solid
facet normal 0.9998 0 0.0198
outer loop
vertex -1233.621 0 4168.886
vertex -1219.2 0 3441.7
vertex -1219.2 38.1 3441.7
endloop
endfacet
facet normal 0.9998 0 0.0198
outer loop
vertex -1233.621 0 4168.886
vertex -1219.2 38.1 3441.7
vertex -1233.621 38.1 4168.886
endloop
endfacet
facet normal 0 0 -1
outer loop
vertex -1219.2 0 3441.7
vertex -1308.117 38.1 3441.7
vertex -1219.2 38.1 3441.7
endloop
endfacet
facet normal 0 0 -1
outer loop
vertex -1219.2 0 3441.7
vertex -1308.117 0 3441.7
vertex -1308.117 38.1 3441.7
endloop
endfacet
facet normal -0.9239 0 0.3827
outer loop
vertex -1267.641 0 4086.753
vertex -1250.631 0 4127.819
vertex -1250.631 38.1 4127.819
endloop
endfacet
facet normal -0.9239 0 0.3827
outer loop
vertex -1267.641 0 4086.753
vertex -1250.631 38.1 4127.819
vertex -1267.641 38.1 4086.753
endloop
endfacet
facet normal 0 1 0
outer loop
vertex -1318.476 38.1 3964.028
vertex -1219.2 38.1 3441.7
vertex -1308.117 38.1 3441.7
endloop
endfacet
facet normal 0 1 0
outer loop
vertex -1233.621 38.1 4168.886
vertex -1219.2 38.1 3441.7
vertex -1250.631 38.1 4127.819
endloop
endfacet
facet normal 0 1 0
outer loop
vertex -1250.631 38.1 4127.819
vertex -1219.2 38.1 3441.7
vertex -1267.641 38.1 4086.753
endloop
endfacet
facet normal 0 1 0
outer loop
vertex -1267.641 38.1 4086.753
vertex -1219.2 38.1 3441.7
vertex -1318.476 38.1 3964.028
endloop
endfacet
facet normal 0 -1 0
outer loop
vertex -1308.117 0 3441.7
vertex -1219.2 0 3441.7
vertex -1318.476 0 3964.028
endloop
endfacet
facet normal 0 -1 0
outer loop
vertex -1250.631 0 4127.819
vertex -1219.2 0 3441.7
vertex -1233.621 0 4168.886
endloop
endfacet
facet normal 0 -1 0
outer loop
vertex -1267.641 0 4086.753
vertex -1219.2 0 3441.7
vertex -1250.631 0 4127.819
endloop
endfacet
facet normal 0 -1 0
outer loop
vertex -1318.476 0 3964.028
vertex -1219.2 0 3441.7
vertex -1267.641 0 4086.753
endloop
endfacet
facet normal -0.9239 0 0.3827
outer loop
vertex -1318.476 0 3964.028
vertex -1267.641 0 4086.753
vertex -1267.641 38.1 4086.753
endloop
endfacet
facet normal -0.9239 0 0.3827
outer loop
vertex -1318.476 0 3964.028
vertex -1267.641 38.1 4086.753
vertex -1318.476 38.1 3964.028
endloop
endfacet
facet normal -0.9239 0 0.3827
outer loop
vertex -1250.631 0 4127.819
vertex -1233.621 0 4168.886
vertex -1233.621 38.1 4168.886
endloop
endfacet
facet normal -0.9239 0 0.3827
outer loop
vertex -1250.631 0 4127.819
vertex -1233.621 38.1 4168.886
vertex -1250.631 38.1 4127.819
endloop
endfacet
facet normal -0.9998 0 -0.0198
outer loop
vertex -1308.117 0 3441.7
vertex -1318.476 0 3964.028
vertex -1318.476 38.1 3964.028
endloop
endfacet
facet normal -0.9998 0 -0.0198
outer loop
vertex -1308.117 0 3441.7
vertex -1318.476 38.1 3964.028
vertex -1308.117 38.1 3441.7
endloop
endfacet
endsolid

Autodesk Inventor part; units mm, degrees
ref_plane "YZ Plane" through (0, 0, 0) normal (1, 0, 0) x (0, 1, 0)
ref_plane "XZ Plane" through (0, 0, 0) normal (0, 1, 0) x (-1, 0, 0)
ref_plane "XY Plane" through (0, 0, 0) normal (0, 0, 1) x (1, 0, 0)
sketch "Sketch1" plane through (0, 0, 0) normal (0, 1, 0) x (-1, 0, 0)
  line L0 (0, 0) -> (0, -1219.2)
  line L1 (0, 0) -> (88.9, 0)
  line L2 (88.9, 0) -> (88.9, -1219.2)
  line L3 (88.9, -1219.2) -> (0, -1219.2)
  line L4 (0, 0) -> (0, 1219.2) construction
  line L5 (0, 1219.2) -> (1219.2, 1219.2) construction
  line L6 (0, 1219.2) -> (0, 3657.6) construction
  line L7 (0, 3657.6) -> (0, 4876.8) construction
  line L8 (0, 4876.8) -> (0, 6096) construction
  line L9 (0, -1219.2) -> (2438.4, -1219.2) construction
  line L10 (0, 6096) -> (2438.4, 6096) construction
  line L11 (2438.4, 6096) -> (2438.4, -1219.2) construction
  line L12 (0, 3657.6) -> (0, 3352.8) construction
  line L13 (0, 3352.8) -> (2438.4, 3352.8) construction
  line L14 (2438.4, 3352.8) -> (1219.2, 3352.8)
  line L15 (1219.2, 3352.8) -> (1219.2, 3263.9)
  line L16 (1219.2, 3263.9) -> (2438.4, 3263.9)
  line L17 (2438.4, 3263.9) -> (2438.4, 3352.8)
  line L18 (0, 6096) -> (862.1046, 6958.1046)
  line L19 (862.1046, 6958.1046) -> (924.9664, 6895.2428)
  line L20 (924.9664, 6895.2428) -> (62.8618, 6033.1382)
  line L21 (62.8618, 6033.1382) -> (0, 6096)
  line L22 (0, 4876.8) -> (1219.2, 4876.8) construction
  line L23 (1219.2, 4876.8) -> (2081.3046, 5738.9046)
  line L24 (1219.2, 1219.2) -> (2081.3046, 357.0954)
  line L25 (2081.3046, 357.0954) -> (2018.4428, 294.2336)
  line L26 (2018.4428, 294.2336) -> (1156.3382, 1156.3382)
  line L27 (1156.3382, 1156.3382) -> (1219.2, 1219.2)
  line L28 (2018.4428, 294.2336) -> (88.9, -1219.2)
  line L29 (2081.3046, 357.0954) -> (2144.1664, 419.9572)
  line L30 (2144.1664, 419.9572) -> (1282.0618, 1282.0618)
  line L31 (1282.0618, 1282.0618) -> (1219.2, 1219.2)
  line L32 (2438.4, 3352.8) -> (2438.4, 3441.7)
  line L33 (2438.4, 3441.7) -> (1219.2, 3441.7)
  line L34 (1219.2, 3441.7) -> (1219.2, 3352.8)
  line L35 (1156.3382, 4939.6618) -> (1282.0618, 4813.9382)
  line L36 (2018.4428, 5801.7664) -> (2144.1664, 5676.0428)
  line L37 (1282.0618, 4813.9382) -> (2144.1664, 5676.0428)
  line L38 (2018.4428, 5801.7664) -> (1156.3382, 4939.6618)
  line L39 (2018.4428, 5801.7664) -> (924.9664, 6895.2428)
  line L40 (62.8618, 6033.1382) -> (1156.3382, 4939.6618)
  line L41 (1233.6206, 4168.8855) -> (1267.6412, 4086.7527)
  line L42 (1263.7078, 2313.9849) -> (1230.0006, 2231.7229)
  arc A0 (862.1046, 6958.1046) -> (0, 6096) centre (431.0523, 6527.0523) ccw
  line L43 (1246.8542, 2272.8539) -> (2375.0183, 1810.583)
  line L44 (2391.8719, 1851.7139) -> (2358.1646, 1769.452)
  line L45 (2391.8719, 1851.7139) -> (1263.7078, 2313.9849)
  line L46 (1230.0006, 2231.7229) -> (2358.1646, 1769.452)
  line L47 (1230.0006, 2231.7229) -> (1219.2, 3263.9)
  line L48 (2144.1664, 419.9572) -> (2391.8719, 1851.7139)
  line L49 (2391.8719, 1851.7139) -> (2438.4, 3263.9)
  line L50 (1219.2, 3441.7) -> (1233.6206, 4168.8855)
  line L51 (1250.6309, 4127.8191) -> (2377.0248, 4594.3867)
  line L52 (2360.0145, 4635.4532) -> (2394.0351, 4553.3203)
  line L53 (2394.0351, 4553.3203) -> (1267.6412, 4086.7527)
  line L54 (2360.0145, 4635.4532) -> (1233.6206, 4168.8855)
  line L55 (2394.0351, 4553.3203) -> (2144.1664, 5676.0428)
  line L56 (2438.4, 3441.7) -> (2394.0351, 4553.3203)
  line L57 (2144.1664, 5676.0428) -> (2057.3895, 5656.7301)
  line L58 (2394.0351, 4553.3203) -> (2305.2058, 4549.7751)
  line L59 (2394.0351, 4553.3203) -> (2307.2582, 4534.0076)
  line L60 (2307.2582, 4534.0076) -> (2057.3895, 5656.7301)
  line L61 (2438.4, 3441.7) -> (2349.5707, 3438.1548)
  line L62 (2349.5707, 3438.1548) -> (2305.2058, 4549.7751)
  line L63 (1219.2, 3441.7) -> (1308.0825, 3439.9374)
  line L64 (1233.6206, 4168.8855) -> (1322.5031, 4167.1229)
  line L65 (1322.5031, 4167.1229) -> (1308.0825, 3439.9374)
  line L66 (2018.4428, 5801.7664) -> (1955.581, 5738.9046)
  line L67 (1955.581, 5738.9046) -> (862.1046, 6832.381)
  line L68 (924.9664, 6895.2428) -> (862.1046, 6832.381)
  line L69 (62.8618, 6033.1382) -> (125.7236, 6096)
  line L70 (62.8618, 6033.1382) -> (125.7236, 6096)
  line L71 (125.7236, 6096) -> (1219.2, 5002.5236)
  line L72 (1156.3382, 1156.3382) -> (0, 0)
  line L73 (0, 0) -> (62.8618, -62.8618)
  line L74 (1156.3382, 1156.3382) -> (1219.2, 1093.4764)
  line L75 (1219.2, 1093.4764) -> (62.8618, -62.8618)
  line L76 (2018.4428, 294.2336) -> (1963.5776, 364.1837)
  line L77 (88.9, -1219.2) -> (34.0348, -1149.2499)
  line L78 (34.0348, -1149.2499) -> (1963.5776, 364.1837)
  line L79 (2144.1664, 419.9572) -> (2056.5677, 435.1125)
  line L80 (2391.8719, 1851.7139) -> (2304.2732, 1866.8692)
  line L81 (2391.8719, 1851.7139) -> (2303.0201, 1854.6414)
  line L82 (2304.2732, 1866.8692) -> (2056.5677, 435.1125)
  line L83 (1230.0006, 2231.7229) -> (1318.8957, 2232.6531)
  line L84 (1219.2, 3263.9) -> (1308.0951, 3264.8302)
  line L85 (1308.0951, 3264.8302) -> (1318.8957, 2232.6531)
  line L86 (2438.4, 3263.9) -> (2349.5482, 3266.8275)
  line L87 (2349.5482, 3266.8275) -> (2303.0201, 1854.6414)
  line L88 (88.9, 0) -> (125.7236, 0)
  line L89 (1233.6206, 4168.8855) -> (1219.2, 4876.8)
  line L90 (1233.6206, 4168.8855) -> (1322.5022, 4170.6961)
  line L91 (1219.2, 4876.8) -> (1308.0816, 4878.6106)
  line L92 (1308.0816, 4878.6106) -> (1322.5022, 4170.6961)
  line L93 (1282.0618, 4813.9382) -> (1309.9674, 4786.0326)
  line L94 (1267.6412, 4086.7527) -> (1318.4756, 3964.0275)
  line L95 (2360.0145, 4635.4532) -> (2374.4273, 4641.4231)
  line L96 (1230.0006, 2231.7229) -> (1219.2, 1219.2)
  line L97 (1230.0006, 2231.7229) -> (1318.8955, 2230.7747)
  line L98 (1219.2, 1219.2) -> (1308.0949, 1218.2518)
  line L99 (1308.0949, 1218.2518) -> (1318.8955, 2230.7747)
  line L100 (1282.0618, 1282.0618) -> (1309.0636, 1309.0636)
  line L101 (1263.7078, 2313.9849) -> (1316.7428, 2438.4)
  line L102 (2358.1646, 1769.452) -> (2376.5379, 1763.082)
  point P0 (1770.957, 2057.4547)
  point P1 (1955.1236, 357.5528)
  point P2 (88.9, -1106.2164)
  point P3 (2292.1025, 1796.5213)
  point P4 (2067.2525, 496.8711)
  point P5 (1318.5187, 2195.4522)
  point P6 (1308.1049, 3263.9)
  point P7 (2349.4518, 3263.9)
  point P8 (2304.1085, 1887.6754)
  point P9 (2306.5112, 4517.0667)
  point P10 (2349.4292, 3441.7)
  point P11 (1308.1175, 3441.7)
  dimension "d0" = 1219.2
  dimension "d2" = 1219.2
  dimension "d3" = 1219.2
  dimension "d16" = 2438.4
  dimension "d17" = 1219.2
  dimension "d18" = 1219.2
  dimension "d20" = 2438.4
  dimension "d21" = 304.8
  dimension "d22" = 1219.2
  dimension "d23" = 88.9
  dimension "d24" = 1219.2
  dimension "d25" = 45
  dimension "d26" = 88.9
  dimension "d27" = 1219.2
  dimension "d28" = 1219.2
  dimension "d29" = 1219.2
  dimension "d31" = 1219.2
  dimension "d32" = 88.9
  dimension "d33" = 88.9
  dimension "d34" = 88.9
  dimension "d35" = 177.8
  dimension "d36" = 177.8
  dimension "d38" = 88.9
  dimension "d39" = 88.9
  dimension "d43" = 1219.2
  dimension "d44" = 88.9
  dimension "d45" = 1219.2
  dimension "d46" = 88.9
  dimension "d47" = 88.9
  dimension "d48" = 88.9
  dimension "d49" = 88.9
  dimension "d50" = 88.9
  dimension "d51" = 88.9
  dimension "d54" = 88.9
  dimension "d55" = 88.9
  dimension "d57" = 88.9
  dimension "d58" = 88.9
  dimension "d59" = 88.9
  dimension "d60" = 88.9
  dimension "d61" = 88.9
  dimension "d64" = 88.9
  dimension "d65" = 88.9
  dimension "d66" = 88.9
  dimension "d69" = 88.9
  dimension "d70" = 88.9
  dimension "d71" = 88.9
  dimension "d72" = 88.9
extrude "Extrusion1" add sketch "Sketch1" along normal blind 38.1 contours L50 L41 L94 L65 L33
properties part number "S_2x4x28.635"
